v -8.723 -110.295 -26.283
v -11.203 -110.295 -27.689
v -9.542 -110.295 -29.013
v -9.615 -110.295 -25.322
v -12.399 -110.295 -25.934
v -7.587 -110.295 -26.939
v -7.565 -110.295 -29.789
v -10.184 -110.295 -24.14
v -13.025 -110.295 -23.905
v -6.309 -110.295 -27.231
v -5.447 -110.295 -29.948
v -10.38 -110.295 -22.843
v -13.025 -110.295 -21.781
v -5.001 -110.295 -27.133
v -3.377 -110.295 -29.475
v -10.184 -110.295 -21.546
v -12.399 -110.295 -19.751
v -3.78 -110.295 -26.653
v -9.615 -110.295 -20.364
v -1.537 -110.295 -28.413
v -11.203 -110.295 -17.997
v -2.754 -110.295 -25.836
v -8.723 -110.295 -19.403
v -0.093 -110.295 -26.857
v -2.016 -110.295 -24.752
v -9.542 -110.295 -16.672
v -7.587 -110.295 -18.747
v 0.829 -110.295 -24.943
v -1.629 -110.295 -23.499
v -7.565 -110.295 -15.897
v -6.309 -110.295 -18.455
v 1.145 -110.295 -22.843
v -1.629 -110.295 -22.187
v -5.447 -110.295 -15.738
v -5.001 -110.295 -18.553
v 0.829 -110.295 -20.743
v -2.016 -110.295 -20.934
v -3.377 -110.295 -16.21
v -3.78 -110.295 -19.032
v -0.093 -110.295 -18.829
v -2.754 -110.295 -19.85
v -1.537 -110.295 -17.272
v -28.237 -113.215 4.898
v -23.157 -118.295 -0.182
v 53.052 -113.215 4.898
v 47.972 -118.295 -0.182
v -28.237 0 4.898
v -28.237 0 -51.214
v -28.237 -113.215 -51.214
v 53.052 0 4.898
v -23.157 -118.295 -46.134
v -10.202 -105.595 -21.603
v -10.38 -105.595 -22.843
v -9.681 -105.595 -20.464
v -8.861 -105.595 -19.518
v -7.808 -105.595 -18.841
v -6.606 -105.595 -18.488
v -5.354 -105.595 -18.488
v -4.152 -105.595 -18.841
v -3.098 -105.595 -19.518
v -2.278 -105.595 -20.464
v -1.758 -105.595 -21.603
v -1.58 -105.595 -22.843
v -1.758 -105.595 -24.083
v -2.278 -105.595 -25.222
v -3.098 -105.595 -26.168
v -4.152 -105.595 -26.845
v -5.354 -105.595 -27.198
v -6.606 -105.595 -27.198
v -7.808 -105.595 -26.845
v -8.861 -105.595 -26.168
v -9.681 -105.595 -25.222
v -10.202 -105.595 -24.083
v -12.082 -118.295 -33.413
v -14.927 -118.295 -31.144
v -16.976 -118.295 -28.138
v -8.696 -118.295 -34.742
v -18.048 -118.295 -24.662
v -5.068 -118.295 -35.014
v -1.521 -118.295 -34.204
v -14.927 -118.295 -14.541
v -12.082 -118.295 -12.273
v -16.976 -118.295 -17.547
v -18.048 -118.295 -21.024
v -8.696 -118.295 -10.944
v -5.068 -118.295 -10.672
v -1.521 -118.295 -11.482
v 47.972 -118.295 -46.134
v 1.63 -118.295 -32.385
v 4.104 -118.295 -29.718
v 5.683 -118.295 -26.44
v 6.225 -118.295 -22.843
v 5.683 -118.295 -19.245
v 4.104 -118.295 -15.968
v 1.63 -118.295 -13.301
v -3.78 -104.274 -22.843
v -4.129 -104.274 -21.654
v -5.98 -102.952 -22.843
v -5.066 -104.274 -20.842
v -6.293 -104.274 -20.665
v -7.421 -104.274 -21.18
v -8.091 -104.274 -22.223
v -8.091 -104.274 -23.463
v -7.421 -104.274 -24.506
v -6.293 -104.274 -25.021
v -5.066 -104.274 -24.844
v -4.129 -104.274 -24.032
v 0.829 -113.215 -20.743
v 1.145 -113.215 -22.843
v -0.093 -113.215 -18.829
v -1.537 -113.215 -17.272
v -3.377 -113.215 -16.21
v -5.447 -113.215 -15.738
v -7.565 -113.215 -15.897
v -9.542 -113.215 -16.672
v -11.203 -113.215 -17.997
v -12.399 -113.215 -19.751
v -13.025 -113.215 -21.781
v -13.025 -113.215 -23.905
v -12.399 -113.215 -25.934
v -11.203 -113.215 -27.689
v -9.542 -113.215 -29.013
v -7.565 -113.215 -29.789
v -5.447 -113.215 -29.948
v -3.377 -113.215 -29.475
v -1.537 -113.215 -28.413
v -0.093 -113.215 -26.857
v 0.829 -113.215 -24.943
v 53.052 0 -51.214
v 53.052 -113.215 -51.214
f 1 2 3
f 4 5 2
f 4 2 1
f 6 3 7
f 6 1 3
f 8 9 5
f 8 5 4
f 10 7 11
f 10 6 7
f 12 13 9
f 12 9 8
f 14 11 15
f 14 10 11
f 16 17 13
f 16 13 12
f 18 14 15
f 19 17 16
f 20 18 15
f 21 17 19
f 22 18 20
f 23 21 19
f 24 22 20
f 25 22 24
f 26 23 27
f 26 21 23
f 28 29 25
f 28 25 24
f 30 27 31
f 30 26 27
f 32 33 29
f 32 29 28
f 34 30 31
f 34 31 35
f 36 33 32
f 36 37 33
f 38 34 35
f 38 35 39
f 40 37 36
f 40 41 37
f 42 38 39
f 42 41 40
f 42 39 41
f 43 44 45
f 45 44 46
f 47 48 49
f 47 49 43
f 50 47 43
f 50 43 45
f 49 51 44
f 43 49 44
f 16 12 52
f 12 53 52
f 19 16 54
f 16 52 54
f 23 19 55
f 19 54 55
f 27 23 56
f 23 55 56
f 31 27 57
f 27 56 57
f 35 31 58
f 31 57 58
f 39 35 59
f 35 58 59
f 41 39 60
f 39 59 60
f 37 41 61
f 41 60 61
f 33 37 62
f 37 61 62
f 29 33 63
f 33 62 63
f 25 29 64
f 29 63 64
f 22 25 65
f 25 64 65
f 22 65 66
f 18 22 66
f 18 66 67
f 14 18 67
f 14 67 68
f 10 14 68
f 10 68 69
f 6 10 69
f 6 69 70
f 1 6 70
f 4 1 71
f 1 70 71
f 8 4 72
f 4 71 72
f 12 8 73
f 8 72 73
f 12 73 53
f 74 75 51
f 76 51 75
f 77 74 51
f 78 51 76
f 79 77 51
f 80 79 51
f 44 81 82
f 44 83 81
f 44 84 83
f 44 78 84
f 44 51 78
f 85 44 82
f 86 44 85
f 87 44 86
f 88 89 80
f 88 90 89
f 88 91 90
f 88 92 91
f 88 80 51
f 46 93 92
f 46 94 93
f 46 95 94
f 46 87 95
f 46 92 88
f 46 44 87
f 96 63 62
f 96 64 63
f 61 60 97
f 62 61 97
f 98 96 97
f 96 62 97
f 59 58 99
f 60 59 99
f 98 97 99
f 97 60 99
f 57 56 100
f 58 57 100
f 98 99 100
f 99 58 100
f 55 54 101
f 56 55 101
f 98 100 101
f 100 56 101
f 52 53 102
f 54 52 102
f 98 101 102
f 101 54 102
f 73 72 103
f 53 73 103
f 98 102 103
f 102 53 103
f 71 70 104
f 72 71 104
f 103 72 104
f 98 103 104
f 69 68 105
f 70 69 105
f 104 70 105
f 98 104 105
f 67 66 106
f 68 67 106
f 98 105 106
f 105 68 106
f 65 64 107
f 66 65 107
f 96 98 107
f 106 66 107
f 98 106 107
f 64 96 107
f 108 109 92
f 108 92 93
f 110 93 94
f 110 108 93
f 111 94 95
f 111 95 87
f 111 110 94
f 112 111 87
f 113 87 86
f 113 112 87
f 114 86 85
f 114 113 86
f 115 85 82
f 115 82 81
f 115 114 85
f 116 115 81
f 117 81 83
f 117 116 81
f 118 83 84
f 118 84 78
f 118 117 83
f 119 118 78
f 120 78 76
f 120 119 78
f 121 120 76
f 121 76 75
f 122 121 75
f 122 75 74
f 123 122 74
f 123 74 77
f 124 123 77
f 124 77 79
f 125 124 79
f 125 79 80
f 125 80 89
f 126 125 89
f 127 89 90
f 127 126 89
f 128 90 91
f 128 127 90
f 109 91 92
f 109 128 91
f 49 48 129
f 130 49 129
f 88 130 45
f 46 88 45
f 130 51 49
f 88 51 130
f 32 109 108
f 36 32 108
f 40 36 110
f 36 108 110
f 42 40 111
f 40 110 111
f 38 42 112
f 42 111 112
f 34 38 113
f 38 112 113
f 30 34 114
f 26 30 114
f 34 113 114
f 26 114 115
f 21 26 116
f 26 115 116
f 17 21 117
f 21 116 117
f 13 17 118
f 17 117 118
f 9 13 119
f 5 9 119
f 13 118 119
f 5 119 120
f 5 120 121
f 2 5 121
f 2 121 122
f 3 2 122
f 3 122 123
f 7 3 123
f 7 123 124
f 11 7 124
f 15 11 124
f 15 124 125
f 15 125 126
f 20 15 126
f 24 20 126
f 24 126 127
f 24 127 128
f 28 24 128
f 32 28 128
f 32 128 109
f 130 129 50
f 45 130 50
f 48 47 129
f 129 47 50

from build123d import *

# Parameters (mm, degrees)
F0_W           = 81.2892764807
F0_H           = 56.1117217876
F1_DEPTH       = 118.29543
F3_D           = 8.8
F3_DEPTH       = 12.7
F3_CBORE_D     = 14.25
F3_CBORE_DEPTH = 8
F3_TIP         = 2.6437867237
F4_SIZE        = 5.08


with BuildPart() as f1:
    # F0 (on Front) → F1 (new body)
    with BuildSketch(Plane.XZ):
        with Locations((12.407310307, -23.1582082342)):
            Rectangle(F0_W, F0_H)
    extrude(amount=F1_DEPTH)

    # F3
    with Locations(Plane.XZ.offset(118.29543)):
        with Locations((-5.9798196889, -22.842913866)):
            CounterBoreHole(F3_D / 2, F3_CBORE_D / 2, F3_CBORE_DEPTH, depth=F3_DEPTH)
            with Locations((0, 0, -(F3_DEPTH + F3_TIP / 2))):  # 118° drill point
                Cone(0, F3_D / 2, F3_TIP, mode=Mode.SUBTRACT)

    # F4
    f4_edges = [f1.edges().sort_by_distance(p)[0] for p in [
        (12.40731, -118.29543, 4.897653),
        (53.051949, -118.29543, -23.158208),
        (-28.237328, -118.29543, -23.158208),
        (12.40731, -118.29543, -51.214069),
        (-13.10482, -118.29543, -22.842914),
    ]]
    chamfer(f4_edges, length=F4_SIZE)


solid = f1.part
